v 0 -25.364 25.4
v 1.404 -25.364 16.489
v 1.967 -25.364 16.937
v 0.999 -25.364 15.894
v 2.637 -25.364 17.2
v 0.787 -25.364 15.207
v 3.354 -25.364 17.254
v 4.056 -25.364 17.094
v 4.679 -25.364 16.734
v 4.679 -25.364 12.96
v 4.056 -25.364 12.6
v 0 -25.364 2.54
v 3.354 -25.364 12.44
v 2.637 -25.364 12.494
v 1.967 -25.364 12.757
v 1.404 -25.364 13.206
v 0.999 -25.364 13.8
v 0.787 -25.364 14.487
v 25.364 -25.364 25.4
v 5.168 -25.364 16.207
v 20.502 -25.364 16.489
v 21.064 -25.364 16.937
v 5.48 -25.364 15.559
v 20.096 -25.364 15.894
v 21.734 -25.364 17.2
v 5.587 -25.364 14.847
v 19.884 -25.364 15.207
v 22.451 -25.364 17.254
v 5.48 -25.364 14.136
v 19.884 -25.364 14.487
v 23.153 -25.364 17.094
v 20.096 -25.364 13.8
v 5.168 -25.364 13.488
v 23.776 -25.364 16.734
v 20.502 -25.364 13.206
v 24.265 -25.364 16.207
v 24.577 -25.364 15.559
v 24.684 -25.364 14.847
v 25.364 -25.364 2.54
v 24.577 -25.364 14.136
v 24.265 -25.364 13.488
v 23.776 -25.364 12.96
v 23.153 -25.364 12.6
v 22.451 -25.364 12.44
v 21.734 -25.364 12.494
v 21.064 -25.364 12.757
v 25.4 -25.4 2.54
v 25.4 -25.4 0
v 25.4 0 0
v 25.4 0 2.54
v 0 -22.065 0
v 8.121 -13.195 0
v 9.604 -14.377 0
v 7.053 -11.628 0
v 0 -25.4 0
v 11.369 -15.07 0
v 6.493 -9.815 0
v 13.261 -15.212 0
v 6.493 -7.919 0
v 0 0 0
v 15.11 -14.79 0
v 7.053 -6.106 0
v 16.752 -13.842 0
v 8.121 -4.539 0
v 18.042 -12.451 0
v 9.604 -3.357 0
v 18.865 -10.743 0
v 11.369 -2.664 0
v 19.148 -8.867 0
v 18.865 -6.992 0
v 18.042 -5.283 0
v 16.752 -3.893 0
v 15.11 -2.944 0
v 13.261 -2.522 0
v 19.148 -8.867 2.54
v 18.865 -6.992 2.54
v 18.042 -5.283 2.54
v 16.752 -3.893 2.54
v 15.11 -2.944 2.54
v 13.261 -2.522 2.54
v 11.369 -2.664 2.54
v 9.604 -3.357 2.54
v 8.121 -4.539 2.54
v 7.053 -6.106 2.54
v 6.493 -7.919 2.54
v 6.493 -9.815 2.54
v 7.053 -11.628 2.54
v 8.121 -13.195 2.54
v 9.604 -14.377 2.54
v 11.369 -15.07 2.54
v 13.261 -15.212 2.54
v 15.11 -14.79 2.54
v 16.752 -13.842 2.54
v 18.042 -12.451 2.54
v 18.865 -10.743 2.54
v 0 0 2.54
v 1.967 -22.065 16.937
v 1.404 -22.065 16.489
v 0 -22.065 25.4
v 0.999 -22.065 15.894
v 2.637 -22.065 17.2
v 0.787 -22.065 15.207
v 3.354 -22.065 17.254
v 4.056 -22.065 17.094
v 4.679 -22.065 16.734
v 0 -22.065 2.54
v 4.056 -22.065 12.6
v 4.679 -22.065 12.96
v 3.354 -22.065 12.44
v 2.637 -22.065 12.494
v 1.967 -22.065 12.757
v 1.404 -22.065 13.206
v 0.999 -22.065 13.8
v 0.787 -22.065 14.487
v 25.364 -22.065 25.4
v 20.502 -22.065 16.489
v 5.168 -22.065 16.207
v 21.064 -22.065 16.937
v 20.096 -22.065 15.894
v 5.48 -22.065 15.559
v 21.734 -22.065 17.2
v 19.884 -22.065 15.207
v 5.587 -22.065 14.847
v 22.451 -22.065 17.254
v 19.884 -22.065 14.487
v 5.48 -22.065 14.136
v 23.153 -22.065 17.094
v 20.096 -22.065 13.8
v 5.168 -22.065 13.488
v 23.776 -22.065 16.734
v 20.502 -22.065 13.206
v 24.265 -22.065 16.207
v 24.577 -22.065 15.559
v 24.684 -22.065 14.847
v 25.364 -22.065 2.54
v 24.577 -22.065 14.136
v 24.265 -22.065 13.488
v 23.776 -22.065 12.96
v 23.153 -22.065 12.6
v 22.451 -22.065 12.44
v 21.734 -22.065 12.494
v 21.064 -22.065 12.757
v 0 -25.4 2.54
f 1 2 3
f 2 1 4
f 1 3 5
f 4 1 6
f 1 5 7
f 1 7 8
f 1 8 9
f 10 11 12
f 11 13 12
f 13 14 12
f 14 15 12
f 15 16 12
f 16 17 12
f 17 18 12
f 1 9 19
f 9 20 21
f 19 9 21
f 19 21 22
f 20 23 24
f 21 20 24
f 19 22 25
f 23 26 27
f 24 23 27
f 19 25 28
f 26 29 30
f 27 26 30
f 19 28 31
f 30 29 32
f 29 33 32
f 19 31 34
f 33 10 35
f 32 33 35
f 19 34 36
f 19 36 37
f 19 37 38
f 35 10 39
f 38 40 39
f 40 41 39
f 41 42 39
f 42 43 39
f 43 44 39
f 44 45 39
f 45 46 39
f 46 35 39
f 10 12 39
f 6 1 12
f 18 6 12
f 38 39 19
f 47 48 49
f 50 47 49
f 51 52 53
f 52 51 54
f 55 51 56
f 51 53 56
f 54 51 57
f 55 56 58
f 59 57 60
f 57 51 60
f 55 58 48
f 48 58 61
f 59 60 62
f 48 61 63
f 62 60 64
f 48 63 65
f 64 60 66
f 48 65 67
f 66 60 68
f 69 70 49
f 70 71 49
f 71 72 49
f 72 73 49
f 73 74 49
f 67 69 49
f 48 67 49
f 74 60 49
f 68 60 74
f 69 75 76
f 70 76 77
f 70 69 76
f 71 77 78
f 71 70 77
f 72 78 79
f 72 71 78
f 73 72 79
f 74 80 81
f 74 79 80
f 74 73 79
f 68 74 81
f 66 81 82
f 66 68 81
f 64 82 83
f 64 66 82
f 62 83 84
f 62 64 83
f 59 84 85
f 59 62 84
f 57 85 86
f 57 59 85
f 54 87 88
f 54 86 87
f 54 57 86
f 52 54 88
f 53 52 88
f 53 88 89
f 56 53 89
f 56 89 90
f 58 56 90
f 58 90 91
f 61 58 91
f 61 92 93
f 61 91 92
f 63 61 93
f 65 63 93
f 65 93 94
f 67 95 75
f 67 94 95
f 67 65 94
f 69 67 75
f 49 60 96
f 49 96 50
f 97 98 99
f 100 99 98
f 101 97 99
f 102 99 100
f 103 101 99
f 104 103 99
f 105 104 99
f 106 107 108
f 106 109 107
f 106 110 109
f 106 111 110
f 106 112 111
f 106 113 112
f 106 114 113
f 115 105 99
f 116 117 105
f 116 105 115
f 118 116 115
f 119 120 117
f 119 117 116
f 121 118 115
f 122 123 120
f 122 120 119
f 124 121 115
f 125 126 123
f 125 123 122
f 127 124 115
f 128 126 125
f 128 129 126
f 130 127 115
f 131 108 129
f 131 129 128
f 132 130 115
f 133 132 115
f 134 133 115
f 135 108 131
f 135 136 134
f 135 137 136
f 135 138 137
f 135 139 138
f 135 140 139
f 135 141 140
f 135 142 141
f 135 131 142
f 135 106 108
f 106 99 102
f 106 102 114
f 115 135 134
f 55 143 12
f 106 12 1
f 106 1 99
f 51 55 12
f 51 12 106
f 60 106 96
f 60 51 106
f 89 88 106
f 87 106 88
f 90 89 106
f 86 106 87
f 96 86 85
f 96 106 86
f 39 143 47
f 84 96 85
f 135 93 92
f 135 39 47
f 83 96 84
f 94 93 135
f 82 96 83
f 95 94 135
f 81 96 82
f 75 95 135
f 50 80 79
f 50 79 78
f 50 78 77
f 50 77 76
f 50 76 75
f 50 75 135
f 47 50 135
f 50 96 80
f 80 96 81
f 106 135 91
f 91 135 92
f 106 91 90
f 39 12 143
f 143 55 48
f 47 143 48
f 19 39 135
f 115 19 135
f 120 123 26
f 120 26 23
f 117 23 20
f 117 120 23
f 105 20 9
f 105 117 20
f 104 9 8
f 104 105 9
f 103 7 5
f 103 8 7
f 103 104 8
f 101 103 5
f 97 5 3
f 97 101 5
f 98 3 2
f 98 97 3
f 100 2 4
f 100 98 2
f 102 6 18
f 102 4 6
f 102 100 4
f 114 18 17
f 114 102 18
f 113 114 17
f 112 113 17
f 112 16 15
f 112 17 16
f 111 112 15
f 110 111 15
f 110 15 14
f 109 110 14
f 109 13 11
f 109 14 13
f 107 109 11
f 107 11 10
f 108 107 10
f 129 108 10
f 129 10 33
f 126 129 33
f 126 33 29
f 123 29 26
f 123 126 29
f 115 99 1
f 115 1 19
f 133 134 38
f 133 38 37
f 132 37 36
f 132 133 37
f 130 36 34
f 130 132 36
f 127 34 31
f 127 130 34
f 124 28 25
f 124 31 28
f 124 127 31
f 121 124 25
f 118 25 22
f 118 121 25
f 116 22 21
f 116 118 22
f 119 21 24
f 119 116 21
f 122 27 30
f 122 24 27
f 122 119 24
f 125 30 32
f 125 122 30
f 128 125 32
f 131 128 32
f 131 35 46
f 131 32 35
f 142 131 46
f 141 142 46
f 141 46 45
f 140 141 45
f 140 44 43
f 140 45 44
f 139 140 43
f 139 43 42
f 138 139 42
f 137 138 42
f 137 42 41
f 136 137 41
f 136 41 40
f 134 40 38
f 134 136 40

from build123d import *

# Parameters (mm, degrees)
F0_W          = 25.4
F0_H          = 25.4
F1_DEPTH      = 2.54
F2_R          = 6.3627
F3_DEPTH      = 25.4
F3_DEPTH_BACK = 25.4
F4_W          = 25.3639966249
F4_H          = 3.2993815839
F5_DEPTH      = 25.4
F6_R          = 2.4136408641
F7_DEPTH      = 52.07


with BuildPart() as f1:
    # F0 (on Top) → F1 (new body)
    with BuildSketch(Plane.XY):
        with Locations((12.7, -12.7)):
            Rectangle(F0_W, F0_H)
    extrude(amount=F1_DEPTH)

    # F2 (on Top) → F3 (cut, two sides)
    with BuildSketch(Plane.XY) as f3_sk:
        with Locations((12.7851041034, -8.867087774)):
            Circle(F2_R)
    extrude(amount=-F3_DEPTH, mode=Mode.SUBTRACT)
    extrude(f3_sk.sketch, amount=F3_DEPTH_BACK, mode=Mode.SUBTRACT)

    # F4 (on Top) → F5 (join)
    with BuildSketch(Plane.XY):
        with Locations((12.6819983125, -23.7143039703)):
            Rectangle(F4_W, F4_H)
    extrude(amount=F5_DEPTH)

    # F6 (on Front) → F7 (cut)
    with BuildSketch(Plane.XZ):
        with Locations((22.2708247602, 14.8472161964)):
            Circle(F6_R)
        with Locations((3.1737023965, 14.8472161964)):
            Circle(F6_R)
    extrude(amount=F7_DEPTH, mode=Mode.SUBTRACT)


solid = f1.part
